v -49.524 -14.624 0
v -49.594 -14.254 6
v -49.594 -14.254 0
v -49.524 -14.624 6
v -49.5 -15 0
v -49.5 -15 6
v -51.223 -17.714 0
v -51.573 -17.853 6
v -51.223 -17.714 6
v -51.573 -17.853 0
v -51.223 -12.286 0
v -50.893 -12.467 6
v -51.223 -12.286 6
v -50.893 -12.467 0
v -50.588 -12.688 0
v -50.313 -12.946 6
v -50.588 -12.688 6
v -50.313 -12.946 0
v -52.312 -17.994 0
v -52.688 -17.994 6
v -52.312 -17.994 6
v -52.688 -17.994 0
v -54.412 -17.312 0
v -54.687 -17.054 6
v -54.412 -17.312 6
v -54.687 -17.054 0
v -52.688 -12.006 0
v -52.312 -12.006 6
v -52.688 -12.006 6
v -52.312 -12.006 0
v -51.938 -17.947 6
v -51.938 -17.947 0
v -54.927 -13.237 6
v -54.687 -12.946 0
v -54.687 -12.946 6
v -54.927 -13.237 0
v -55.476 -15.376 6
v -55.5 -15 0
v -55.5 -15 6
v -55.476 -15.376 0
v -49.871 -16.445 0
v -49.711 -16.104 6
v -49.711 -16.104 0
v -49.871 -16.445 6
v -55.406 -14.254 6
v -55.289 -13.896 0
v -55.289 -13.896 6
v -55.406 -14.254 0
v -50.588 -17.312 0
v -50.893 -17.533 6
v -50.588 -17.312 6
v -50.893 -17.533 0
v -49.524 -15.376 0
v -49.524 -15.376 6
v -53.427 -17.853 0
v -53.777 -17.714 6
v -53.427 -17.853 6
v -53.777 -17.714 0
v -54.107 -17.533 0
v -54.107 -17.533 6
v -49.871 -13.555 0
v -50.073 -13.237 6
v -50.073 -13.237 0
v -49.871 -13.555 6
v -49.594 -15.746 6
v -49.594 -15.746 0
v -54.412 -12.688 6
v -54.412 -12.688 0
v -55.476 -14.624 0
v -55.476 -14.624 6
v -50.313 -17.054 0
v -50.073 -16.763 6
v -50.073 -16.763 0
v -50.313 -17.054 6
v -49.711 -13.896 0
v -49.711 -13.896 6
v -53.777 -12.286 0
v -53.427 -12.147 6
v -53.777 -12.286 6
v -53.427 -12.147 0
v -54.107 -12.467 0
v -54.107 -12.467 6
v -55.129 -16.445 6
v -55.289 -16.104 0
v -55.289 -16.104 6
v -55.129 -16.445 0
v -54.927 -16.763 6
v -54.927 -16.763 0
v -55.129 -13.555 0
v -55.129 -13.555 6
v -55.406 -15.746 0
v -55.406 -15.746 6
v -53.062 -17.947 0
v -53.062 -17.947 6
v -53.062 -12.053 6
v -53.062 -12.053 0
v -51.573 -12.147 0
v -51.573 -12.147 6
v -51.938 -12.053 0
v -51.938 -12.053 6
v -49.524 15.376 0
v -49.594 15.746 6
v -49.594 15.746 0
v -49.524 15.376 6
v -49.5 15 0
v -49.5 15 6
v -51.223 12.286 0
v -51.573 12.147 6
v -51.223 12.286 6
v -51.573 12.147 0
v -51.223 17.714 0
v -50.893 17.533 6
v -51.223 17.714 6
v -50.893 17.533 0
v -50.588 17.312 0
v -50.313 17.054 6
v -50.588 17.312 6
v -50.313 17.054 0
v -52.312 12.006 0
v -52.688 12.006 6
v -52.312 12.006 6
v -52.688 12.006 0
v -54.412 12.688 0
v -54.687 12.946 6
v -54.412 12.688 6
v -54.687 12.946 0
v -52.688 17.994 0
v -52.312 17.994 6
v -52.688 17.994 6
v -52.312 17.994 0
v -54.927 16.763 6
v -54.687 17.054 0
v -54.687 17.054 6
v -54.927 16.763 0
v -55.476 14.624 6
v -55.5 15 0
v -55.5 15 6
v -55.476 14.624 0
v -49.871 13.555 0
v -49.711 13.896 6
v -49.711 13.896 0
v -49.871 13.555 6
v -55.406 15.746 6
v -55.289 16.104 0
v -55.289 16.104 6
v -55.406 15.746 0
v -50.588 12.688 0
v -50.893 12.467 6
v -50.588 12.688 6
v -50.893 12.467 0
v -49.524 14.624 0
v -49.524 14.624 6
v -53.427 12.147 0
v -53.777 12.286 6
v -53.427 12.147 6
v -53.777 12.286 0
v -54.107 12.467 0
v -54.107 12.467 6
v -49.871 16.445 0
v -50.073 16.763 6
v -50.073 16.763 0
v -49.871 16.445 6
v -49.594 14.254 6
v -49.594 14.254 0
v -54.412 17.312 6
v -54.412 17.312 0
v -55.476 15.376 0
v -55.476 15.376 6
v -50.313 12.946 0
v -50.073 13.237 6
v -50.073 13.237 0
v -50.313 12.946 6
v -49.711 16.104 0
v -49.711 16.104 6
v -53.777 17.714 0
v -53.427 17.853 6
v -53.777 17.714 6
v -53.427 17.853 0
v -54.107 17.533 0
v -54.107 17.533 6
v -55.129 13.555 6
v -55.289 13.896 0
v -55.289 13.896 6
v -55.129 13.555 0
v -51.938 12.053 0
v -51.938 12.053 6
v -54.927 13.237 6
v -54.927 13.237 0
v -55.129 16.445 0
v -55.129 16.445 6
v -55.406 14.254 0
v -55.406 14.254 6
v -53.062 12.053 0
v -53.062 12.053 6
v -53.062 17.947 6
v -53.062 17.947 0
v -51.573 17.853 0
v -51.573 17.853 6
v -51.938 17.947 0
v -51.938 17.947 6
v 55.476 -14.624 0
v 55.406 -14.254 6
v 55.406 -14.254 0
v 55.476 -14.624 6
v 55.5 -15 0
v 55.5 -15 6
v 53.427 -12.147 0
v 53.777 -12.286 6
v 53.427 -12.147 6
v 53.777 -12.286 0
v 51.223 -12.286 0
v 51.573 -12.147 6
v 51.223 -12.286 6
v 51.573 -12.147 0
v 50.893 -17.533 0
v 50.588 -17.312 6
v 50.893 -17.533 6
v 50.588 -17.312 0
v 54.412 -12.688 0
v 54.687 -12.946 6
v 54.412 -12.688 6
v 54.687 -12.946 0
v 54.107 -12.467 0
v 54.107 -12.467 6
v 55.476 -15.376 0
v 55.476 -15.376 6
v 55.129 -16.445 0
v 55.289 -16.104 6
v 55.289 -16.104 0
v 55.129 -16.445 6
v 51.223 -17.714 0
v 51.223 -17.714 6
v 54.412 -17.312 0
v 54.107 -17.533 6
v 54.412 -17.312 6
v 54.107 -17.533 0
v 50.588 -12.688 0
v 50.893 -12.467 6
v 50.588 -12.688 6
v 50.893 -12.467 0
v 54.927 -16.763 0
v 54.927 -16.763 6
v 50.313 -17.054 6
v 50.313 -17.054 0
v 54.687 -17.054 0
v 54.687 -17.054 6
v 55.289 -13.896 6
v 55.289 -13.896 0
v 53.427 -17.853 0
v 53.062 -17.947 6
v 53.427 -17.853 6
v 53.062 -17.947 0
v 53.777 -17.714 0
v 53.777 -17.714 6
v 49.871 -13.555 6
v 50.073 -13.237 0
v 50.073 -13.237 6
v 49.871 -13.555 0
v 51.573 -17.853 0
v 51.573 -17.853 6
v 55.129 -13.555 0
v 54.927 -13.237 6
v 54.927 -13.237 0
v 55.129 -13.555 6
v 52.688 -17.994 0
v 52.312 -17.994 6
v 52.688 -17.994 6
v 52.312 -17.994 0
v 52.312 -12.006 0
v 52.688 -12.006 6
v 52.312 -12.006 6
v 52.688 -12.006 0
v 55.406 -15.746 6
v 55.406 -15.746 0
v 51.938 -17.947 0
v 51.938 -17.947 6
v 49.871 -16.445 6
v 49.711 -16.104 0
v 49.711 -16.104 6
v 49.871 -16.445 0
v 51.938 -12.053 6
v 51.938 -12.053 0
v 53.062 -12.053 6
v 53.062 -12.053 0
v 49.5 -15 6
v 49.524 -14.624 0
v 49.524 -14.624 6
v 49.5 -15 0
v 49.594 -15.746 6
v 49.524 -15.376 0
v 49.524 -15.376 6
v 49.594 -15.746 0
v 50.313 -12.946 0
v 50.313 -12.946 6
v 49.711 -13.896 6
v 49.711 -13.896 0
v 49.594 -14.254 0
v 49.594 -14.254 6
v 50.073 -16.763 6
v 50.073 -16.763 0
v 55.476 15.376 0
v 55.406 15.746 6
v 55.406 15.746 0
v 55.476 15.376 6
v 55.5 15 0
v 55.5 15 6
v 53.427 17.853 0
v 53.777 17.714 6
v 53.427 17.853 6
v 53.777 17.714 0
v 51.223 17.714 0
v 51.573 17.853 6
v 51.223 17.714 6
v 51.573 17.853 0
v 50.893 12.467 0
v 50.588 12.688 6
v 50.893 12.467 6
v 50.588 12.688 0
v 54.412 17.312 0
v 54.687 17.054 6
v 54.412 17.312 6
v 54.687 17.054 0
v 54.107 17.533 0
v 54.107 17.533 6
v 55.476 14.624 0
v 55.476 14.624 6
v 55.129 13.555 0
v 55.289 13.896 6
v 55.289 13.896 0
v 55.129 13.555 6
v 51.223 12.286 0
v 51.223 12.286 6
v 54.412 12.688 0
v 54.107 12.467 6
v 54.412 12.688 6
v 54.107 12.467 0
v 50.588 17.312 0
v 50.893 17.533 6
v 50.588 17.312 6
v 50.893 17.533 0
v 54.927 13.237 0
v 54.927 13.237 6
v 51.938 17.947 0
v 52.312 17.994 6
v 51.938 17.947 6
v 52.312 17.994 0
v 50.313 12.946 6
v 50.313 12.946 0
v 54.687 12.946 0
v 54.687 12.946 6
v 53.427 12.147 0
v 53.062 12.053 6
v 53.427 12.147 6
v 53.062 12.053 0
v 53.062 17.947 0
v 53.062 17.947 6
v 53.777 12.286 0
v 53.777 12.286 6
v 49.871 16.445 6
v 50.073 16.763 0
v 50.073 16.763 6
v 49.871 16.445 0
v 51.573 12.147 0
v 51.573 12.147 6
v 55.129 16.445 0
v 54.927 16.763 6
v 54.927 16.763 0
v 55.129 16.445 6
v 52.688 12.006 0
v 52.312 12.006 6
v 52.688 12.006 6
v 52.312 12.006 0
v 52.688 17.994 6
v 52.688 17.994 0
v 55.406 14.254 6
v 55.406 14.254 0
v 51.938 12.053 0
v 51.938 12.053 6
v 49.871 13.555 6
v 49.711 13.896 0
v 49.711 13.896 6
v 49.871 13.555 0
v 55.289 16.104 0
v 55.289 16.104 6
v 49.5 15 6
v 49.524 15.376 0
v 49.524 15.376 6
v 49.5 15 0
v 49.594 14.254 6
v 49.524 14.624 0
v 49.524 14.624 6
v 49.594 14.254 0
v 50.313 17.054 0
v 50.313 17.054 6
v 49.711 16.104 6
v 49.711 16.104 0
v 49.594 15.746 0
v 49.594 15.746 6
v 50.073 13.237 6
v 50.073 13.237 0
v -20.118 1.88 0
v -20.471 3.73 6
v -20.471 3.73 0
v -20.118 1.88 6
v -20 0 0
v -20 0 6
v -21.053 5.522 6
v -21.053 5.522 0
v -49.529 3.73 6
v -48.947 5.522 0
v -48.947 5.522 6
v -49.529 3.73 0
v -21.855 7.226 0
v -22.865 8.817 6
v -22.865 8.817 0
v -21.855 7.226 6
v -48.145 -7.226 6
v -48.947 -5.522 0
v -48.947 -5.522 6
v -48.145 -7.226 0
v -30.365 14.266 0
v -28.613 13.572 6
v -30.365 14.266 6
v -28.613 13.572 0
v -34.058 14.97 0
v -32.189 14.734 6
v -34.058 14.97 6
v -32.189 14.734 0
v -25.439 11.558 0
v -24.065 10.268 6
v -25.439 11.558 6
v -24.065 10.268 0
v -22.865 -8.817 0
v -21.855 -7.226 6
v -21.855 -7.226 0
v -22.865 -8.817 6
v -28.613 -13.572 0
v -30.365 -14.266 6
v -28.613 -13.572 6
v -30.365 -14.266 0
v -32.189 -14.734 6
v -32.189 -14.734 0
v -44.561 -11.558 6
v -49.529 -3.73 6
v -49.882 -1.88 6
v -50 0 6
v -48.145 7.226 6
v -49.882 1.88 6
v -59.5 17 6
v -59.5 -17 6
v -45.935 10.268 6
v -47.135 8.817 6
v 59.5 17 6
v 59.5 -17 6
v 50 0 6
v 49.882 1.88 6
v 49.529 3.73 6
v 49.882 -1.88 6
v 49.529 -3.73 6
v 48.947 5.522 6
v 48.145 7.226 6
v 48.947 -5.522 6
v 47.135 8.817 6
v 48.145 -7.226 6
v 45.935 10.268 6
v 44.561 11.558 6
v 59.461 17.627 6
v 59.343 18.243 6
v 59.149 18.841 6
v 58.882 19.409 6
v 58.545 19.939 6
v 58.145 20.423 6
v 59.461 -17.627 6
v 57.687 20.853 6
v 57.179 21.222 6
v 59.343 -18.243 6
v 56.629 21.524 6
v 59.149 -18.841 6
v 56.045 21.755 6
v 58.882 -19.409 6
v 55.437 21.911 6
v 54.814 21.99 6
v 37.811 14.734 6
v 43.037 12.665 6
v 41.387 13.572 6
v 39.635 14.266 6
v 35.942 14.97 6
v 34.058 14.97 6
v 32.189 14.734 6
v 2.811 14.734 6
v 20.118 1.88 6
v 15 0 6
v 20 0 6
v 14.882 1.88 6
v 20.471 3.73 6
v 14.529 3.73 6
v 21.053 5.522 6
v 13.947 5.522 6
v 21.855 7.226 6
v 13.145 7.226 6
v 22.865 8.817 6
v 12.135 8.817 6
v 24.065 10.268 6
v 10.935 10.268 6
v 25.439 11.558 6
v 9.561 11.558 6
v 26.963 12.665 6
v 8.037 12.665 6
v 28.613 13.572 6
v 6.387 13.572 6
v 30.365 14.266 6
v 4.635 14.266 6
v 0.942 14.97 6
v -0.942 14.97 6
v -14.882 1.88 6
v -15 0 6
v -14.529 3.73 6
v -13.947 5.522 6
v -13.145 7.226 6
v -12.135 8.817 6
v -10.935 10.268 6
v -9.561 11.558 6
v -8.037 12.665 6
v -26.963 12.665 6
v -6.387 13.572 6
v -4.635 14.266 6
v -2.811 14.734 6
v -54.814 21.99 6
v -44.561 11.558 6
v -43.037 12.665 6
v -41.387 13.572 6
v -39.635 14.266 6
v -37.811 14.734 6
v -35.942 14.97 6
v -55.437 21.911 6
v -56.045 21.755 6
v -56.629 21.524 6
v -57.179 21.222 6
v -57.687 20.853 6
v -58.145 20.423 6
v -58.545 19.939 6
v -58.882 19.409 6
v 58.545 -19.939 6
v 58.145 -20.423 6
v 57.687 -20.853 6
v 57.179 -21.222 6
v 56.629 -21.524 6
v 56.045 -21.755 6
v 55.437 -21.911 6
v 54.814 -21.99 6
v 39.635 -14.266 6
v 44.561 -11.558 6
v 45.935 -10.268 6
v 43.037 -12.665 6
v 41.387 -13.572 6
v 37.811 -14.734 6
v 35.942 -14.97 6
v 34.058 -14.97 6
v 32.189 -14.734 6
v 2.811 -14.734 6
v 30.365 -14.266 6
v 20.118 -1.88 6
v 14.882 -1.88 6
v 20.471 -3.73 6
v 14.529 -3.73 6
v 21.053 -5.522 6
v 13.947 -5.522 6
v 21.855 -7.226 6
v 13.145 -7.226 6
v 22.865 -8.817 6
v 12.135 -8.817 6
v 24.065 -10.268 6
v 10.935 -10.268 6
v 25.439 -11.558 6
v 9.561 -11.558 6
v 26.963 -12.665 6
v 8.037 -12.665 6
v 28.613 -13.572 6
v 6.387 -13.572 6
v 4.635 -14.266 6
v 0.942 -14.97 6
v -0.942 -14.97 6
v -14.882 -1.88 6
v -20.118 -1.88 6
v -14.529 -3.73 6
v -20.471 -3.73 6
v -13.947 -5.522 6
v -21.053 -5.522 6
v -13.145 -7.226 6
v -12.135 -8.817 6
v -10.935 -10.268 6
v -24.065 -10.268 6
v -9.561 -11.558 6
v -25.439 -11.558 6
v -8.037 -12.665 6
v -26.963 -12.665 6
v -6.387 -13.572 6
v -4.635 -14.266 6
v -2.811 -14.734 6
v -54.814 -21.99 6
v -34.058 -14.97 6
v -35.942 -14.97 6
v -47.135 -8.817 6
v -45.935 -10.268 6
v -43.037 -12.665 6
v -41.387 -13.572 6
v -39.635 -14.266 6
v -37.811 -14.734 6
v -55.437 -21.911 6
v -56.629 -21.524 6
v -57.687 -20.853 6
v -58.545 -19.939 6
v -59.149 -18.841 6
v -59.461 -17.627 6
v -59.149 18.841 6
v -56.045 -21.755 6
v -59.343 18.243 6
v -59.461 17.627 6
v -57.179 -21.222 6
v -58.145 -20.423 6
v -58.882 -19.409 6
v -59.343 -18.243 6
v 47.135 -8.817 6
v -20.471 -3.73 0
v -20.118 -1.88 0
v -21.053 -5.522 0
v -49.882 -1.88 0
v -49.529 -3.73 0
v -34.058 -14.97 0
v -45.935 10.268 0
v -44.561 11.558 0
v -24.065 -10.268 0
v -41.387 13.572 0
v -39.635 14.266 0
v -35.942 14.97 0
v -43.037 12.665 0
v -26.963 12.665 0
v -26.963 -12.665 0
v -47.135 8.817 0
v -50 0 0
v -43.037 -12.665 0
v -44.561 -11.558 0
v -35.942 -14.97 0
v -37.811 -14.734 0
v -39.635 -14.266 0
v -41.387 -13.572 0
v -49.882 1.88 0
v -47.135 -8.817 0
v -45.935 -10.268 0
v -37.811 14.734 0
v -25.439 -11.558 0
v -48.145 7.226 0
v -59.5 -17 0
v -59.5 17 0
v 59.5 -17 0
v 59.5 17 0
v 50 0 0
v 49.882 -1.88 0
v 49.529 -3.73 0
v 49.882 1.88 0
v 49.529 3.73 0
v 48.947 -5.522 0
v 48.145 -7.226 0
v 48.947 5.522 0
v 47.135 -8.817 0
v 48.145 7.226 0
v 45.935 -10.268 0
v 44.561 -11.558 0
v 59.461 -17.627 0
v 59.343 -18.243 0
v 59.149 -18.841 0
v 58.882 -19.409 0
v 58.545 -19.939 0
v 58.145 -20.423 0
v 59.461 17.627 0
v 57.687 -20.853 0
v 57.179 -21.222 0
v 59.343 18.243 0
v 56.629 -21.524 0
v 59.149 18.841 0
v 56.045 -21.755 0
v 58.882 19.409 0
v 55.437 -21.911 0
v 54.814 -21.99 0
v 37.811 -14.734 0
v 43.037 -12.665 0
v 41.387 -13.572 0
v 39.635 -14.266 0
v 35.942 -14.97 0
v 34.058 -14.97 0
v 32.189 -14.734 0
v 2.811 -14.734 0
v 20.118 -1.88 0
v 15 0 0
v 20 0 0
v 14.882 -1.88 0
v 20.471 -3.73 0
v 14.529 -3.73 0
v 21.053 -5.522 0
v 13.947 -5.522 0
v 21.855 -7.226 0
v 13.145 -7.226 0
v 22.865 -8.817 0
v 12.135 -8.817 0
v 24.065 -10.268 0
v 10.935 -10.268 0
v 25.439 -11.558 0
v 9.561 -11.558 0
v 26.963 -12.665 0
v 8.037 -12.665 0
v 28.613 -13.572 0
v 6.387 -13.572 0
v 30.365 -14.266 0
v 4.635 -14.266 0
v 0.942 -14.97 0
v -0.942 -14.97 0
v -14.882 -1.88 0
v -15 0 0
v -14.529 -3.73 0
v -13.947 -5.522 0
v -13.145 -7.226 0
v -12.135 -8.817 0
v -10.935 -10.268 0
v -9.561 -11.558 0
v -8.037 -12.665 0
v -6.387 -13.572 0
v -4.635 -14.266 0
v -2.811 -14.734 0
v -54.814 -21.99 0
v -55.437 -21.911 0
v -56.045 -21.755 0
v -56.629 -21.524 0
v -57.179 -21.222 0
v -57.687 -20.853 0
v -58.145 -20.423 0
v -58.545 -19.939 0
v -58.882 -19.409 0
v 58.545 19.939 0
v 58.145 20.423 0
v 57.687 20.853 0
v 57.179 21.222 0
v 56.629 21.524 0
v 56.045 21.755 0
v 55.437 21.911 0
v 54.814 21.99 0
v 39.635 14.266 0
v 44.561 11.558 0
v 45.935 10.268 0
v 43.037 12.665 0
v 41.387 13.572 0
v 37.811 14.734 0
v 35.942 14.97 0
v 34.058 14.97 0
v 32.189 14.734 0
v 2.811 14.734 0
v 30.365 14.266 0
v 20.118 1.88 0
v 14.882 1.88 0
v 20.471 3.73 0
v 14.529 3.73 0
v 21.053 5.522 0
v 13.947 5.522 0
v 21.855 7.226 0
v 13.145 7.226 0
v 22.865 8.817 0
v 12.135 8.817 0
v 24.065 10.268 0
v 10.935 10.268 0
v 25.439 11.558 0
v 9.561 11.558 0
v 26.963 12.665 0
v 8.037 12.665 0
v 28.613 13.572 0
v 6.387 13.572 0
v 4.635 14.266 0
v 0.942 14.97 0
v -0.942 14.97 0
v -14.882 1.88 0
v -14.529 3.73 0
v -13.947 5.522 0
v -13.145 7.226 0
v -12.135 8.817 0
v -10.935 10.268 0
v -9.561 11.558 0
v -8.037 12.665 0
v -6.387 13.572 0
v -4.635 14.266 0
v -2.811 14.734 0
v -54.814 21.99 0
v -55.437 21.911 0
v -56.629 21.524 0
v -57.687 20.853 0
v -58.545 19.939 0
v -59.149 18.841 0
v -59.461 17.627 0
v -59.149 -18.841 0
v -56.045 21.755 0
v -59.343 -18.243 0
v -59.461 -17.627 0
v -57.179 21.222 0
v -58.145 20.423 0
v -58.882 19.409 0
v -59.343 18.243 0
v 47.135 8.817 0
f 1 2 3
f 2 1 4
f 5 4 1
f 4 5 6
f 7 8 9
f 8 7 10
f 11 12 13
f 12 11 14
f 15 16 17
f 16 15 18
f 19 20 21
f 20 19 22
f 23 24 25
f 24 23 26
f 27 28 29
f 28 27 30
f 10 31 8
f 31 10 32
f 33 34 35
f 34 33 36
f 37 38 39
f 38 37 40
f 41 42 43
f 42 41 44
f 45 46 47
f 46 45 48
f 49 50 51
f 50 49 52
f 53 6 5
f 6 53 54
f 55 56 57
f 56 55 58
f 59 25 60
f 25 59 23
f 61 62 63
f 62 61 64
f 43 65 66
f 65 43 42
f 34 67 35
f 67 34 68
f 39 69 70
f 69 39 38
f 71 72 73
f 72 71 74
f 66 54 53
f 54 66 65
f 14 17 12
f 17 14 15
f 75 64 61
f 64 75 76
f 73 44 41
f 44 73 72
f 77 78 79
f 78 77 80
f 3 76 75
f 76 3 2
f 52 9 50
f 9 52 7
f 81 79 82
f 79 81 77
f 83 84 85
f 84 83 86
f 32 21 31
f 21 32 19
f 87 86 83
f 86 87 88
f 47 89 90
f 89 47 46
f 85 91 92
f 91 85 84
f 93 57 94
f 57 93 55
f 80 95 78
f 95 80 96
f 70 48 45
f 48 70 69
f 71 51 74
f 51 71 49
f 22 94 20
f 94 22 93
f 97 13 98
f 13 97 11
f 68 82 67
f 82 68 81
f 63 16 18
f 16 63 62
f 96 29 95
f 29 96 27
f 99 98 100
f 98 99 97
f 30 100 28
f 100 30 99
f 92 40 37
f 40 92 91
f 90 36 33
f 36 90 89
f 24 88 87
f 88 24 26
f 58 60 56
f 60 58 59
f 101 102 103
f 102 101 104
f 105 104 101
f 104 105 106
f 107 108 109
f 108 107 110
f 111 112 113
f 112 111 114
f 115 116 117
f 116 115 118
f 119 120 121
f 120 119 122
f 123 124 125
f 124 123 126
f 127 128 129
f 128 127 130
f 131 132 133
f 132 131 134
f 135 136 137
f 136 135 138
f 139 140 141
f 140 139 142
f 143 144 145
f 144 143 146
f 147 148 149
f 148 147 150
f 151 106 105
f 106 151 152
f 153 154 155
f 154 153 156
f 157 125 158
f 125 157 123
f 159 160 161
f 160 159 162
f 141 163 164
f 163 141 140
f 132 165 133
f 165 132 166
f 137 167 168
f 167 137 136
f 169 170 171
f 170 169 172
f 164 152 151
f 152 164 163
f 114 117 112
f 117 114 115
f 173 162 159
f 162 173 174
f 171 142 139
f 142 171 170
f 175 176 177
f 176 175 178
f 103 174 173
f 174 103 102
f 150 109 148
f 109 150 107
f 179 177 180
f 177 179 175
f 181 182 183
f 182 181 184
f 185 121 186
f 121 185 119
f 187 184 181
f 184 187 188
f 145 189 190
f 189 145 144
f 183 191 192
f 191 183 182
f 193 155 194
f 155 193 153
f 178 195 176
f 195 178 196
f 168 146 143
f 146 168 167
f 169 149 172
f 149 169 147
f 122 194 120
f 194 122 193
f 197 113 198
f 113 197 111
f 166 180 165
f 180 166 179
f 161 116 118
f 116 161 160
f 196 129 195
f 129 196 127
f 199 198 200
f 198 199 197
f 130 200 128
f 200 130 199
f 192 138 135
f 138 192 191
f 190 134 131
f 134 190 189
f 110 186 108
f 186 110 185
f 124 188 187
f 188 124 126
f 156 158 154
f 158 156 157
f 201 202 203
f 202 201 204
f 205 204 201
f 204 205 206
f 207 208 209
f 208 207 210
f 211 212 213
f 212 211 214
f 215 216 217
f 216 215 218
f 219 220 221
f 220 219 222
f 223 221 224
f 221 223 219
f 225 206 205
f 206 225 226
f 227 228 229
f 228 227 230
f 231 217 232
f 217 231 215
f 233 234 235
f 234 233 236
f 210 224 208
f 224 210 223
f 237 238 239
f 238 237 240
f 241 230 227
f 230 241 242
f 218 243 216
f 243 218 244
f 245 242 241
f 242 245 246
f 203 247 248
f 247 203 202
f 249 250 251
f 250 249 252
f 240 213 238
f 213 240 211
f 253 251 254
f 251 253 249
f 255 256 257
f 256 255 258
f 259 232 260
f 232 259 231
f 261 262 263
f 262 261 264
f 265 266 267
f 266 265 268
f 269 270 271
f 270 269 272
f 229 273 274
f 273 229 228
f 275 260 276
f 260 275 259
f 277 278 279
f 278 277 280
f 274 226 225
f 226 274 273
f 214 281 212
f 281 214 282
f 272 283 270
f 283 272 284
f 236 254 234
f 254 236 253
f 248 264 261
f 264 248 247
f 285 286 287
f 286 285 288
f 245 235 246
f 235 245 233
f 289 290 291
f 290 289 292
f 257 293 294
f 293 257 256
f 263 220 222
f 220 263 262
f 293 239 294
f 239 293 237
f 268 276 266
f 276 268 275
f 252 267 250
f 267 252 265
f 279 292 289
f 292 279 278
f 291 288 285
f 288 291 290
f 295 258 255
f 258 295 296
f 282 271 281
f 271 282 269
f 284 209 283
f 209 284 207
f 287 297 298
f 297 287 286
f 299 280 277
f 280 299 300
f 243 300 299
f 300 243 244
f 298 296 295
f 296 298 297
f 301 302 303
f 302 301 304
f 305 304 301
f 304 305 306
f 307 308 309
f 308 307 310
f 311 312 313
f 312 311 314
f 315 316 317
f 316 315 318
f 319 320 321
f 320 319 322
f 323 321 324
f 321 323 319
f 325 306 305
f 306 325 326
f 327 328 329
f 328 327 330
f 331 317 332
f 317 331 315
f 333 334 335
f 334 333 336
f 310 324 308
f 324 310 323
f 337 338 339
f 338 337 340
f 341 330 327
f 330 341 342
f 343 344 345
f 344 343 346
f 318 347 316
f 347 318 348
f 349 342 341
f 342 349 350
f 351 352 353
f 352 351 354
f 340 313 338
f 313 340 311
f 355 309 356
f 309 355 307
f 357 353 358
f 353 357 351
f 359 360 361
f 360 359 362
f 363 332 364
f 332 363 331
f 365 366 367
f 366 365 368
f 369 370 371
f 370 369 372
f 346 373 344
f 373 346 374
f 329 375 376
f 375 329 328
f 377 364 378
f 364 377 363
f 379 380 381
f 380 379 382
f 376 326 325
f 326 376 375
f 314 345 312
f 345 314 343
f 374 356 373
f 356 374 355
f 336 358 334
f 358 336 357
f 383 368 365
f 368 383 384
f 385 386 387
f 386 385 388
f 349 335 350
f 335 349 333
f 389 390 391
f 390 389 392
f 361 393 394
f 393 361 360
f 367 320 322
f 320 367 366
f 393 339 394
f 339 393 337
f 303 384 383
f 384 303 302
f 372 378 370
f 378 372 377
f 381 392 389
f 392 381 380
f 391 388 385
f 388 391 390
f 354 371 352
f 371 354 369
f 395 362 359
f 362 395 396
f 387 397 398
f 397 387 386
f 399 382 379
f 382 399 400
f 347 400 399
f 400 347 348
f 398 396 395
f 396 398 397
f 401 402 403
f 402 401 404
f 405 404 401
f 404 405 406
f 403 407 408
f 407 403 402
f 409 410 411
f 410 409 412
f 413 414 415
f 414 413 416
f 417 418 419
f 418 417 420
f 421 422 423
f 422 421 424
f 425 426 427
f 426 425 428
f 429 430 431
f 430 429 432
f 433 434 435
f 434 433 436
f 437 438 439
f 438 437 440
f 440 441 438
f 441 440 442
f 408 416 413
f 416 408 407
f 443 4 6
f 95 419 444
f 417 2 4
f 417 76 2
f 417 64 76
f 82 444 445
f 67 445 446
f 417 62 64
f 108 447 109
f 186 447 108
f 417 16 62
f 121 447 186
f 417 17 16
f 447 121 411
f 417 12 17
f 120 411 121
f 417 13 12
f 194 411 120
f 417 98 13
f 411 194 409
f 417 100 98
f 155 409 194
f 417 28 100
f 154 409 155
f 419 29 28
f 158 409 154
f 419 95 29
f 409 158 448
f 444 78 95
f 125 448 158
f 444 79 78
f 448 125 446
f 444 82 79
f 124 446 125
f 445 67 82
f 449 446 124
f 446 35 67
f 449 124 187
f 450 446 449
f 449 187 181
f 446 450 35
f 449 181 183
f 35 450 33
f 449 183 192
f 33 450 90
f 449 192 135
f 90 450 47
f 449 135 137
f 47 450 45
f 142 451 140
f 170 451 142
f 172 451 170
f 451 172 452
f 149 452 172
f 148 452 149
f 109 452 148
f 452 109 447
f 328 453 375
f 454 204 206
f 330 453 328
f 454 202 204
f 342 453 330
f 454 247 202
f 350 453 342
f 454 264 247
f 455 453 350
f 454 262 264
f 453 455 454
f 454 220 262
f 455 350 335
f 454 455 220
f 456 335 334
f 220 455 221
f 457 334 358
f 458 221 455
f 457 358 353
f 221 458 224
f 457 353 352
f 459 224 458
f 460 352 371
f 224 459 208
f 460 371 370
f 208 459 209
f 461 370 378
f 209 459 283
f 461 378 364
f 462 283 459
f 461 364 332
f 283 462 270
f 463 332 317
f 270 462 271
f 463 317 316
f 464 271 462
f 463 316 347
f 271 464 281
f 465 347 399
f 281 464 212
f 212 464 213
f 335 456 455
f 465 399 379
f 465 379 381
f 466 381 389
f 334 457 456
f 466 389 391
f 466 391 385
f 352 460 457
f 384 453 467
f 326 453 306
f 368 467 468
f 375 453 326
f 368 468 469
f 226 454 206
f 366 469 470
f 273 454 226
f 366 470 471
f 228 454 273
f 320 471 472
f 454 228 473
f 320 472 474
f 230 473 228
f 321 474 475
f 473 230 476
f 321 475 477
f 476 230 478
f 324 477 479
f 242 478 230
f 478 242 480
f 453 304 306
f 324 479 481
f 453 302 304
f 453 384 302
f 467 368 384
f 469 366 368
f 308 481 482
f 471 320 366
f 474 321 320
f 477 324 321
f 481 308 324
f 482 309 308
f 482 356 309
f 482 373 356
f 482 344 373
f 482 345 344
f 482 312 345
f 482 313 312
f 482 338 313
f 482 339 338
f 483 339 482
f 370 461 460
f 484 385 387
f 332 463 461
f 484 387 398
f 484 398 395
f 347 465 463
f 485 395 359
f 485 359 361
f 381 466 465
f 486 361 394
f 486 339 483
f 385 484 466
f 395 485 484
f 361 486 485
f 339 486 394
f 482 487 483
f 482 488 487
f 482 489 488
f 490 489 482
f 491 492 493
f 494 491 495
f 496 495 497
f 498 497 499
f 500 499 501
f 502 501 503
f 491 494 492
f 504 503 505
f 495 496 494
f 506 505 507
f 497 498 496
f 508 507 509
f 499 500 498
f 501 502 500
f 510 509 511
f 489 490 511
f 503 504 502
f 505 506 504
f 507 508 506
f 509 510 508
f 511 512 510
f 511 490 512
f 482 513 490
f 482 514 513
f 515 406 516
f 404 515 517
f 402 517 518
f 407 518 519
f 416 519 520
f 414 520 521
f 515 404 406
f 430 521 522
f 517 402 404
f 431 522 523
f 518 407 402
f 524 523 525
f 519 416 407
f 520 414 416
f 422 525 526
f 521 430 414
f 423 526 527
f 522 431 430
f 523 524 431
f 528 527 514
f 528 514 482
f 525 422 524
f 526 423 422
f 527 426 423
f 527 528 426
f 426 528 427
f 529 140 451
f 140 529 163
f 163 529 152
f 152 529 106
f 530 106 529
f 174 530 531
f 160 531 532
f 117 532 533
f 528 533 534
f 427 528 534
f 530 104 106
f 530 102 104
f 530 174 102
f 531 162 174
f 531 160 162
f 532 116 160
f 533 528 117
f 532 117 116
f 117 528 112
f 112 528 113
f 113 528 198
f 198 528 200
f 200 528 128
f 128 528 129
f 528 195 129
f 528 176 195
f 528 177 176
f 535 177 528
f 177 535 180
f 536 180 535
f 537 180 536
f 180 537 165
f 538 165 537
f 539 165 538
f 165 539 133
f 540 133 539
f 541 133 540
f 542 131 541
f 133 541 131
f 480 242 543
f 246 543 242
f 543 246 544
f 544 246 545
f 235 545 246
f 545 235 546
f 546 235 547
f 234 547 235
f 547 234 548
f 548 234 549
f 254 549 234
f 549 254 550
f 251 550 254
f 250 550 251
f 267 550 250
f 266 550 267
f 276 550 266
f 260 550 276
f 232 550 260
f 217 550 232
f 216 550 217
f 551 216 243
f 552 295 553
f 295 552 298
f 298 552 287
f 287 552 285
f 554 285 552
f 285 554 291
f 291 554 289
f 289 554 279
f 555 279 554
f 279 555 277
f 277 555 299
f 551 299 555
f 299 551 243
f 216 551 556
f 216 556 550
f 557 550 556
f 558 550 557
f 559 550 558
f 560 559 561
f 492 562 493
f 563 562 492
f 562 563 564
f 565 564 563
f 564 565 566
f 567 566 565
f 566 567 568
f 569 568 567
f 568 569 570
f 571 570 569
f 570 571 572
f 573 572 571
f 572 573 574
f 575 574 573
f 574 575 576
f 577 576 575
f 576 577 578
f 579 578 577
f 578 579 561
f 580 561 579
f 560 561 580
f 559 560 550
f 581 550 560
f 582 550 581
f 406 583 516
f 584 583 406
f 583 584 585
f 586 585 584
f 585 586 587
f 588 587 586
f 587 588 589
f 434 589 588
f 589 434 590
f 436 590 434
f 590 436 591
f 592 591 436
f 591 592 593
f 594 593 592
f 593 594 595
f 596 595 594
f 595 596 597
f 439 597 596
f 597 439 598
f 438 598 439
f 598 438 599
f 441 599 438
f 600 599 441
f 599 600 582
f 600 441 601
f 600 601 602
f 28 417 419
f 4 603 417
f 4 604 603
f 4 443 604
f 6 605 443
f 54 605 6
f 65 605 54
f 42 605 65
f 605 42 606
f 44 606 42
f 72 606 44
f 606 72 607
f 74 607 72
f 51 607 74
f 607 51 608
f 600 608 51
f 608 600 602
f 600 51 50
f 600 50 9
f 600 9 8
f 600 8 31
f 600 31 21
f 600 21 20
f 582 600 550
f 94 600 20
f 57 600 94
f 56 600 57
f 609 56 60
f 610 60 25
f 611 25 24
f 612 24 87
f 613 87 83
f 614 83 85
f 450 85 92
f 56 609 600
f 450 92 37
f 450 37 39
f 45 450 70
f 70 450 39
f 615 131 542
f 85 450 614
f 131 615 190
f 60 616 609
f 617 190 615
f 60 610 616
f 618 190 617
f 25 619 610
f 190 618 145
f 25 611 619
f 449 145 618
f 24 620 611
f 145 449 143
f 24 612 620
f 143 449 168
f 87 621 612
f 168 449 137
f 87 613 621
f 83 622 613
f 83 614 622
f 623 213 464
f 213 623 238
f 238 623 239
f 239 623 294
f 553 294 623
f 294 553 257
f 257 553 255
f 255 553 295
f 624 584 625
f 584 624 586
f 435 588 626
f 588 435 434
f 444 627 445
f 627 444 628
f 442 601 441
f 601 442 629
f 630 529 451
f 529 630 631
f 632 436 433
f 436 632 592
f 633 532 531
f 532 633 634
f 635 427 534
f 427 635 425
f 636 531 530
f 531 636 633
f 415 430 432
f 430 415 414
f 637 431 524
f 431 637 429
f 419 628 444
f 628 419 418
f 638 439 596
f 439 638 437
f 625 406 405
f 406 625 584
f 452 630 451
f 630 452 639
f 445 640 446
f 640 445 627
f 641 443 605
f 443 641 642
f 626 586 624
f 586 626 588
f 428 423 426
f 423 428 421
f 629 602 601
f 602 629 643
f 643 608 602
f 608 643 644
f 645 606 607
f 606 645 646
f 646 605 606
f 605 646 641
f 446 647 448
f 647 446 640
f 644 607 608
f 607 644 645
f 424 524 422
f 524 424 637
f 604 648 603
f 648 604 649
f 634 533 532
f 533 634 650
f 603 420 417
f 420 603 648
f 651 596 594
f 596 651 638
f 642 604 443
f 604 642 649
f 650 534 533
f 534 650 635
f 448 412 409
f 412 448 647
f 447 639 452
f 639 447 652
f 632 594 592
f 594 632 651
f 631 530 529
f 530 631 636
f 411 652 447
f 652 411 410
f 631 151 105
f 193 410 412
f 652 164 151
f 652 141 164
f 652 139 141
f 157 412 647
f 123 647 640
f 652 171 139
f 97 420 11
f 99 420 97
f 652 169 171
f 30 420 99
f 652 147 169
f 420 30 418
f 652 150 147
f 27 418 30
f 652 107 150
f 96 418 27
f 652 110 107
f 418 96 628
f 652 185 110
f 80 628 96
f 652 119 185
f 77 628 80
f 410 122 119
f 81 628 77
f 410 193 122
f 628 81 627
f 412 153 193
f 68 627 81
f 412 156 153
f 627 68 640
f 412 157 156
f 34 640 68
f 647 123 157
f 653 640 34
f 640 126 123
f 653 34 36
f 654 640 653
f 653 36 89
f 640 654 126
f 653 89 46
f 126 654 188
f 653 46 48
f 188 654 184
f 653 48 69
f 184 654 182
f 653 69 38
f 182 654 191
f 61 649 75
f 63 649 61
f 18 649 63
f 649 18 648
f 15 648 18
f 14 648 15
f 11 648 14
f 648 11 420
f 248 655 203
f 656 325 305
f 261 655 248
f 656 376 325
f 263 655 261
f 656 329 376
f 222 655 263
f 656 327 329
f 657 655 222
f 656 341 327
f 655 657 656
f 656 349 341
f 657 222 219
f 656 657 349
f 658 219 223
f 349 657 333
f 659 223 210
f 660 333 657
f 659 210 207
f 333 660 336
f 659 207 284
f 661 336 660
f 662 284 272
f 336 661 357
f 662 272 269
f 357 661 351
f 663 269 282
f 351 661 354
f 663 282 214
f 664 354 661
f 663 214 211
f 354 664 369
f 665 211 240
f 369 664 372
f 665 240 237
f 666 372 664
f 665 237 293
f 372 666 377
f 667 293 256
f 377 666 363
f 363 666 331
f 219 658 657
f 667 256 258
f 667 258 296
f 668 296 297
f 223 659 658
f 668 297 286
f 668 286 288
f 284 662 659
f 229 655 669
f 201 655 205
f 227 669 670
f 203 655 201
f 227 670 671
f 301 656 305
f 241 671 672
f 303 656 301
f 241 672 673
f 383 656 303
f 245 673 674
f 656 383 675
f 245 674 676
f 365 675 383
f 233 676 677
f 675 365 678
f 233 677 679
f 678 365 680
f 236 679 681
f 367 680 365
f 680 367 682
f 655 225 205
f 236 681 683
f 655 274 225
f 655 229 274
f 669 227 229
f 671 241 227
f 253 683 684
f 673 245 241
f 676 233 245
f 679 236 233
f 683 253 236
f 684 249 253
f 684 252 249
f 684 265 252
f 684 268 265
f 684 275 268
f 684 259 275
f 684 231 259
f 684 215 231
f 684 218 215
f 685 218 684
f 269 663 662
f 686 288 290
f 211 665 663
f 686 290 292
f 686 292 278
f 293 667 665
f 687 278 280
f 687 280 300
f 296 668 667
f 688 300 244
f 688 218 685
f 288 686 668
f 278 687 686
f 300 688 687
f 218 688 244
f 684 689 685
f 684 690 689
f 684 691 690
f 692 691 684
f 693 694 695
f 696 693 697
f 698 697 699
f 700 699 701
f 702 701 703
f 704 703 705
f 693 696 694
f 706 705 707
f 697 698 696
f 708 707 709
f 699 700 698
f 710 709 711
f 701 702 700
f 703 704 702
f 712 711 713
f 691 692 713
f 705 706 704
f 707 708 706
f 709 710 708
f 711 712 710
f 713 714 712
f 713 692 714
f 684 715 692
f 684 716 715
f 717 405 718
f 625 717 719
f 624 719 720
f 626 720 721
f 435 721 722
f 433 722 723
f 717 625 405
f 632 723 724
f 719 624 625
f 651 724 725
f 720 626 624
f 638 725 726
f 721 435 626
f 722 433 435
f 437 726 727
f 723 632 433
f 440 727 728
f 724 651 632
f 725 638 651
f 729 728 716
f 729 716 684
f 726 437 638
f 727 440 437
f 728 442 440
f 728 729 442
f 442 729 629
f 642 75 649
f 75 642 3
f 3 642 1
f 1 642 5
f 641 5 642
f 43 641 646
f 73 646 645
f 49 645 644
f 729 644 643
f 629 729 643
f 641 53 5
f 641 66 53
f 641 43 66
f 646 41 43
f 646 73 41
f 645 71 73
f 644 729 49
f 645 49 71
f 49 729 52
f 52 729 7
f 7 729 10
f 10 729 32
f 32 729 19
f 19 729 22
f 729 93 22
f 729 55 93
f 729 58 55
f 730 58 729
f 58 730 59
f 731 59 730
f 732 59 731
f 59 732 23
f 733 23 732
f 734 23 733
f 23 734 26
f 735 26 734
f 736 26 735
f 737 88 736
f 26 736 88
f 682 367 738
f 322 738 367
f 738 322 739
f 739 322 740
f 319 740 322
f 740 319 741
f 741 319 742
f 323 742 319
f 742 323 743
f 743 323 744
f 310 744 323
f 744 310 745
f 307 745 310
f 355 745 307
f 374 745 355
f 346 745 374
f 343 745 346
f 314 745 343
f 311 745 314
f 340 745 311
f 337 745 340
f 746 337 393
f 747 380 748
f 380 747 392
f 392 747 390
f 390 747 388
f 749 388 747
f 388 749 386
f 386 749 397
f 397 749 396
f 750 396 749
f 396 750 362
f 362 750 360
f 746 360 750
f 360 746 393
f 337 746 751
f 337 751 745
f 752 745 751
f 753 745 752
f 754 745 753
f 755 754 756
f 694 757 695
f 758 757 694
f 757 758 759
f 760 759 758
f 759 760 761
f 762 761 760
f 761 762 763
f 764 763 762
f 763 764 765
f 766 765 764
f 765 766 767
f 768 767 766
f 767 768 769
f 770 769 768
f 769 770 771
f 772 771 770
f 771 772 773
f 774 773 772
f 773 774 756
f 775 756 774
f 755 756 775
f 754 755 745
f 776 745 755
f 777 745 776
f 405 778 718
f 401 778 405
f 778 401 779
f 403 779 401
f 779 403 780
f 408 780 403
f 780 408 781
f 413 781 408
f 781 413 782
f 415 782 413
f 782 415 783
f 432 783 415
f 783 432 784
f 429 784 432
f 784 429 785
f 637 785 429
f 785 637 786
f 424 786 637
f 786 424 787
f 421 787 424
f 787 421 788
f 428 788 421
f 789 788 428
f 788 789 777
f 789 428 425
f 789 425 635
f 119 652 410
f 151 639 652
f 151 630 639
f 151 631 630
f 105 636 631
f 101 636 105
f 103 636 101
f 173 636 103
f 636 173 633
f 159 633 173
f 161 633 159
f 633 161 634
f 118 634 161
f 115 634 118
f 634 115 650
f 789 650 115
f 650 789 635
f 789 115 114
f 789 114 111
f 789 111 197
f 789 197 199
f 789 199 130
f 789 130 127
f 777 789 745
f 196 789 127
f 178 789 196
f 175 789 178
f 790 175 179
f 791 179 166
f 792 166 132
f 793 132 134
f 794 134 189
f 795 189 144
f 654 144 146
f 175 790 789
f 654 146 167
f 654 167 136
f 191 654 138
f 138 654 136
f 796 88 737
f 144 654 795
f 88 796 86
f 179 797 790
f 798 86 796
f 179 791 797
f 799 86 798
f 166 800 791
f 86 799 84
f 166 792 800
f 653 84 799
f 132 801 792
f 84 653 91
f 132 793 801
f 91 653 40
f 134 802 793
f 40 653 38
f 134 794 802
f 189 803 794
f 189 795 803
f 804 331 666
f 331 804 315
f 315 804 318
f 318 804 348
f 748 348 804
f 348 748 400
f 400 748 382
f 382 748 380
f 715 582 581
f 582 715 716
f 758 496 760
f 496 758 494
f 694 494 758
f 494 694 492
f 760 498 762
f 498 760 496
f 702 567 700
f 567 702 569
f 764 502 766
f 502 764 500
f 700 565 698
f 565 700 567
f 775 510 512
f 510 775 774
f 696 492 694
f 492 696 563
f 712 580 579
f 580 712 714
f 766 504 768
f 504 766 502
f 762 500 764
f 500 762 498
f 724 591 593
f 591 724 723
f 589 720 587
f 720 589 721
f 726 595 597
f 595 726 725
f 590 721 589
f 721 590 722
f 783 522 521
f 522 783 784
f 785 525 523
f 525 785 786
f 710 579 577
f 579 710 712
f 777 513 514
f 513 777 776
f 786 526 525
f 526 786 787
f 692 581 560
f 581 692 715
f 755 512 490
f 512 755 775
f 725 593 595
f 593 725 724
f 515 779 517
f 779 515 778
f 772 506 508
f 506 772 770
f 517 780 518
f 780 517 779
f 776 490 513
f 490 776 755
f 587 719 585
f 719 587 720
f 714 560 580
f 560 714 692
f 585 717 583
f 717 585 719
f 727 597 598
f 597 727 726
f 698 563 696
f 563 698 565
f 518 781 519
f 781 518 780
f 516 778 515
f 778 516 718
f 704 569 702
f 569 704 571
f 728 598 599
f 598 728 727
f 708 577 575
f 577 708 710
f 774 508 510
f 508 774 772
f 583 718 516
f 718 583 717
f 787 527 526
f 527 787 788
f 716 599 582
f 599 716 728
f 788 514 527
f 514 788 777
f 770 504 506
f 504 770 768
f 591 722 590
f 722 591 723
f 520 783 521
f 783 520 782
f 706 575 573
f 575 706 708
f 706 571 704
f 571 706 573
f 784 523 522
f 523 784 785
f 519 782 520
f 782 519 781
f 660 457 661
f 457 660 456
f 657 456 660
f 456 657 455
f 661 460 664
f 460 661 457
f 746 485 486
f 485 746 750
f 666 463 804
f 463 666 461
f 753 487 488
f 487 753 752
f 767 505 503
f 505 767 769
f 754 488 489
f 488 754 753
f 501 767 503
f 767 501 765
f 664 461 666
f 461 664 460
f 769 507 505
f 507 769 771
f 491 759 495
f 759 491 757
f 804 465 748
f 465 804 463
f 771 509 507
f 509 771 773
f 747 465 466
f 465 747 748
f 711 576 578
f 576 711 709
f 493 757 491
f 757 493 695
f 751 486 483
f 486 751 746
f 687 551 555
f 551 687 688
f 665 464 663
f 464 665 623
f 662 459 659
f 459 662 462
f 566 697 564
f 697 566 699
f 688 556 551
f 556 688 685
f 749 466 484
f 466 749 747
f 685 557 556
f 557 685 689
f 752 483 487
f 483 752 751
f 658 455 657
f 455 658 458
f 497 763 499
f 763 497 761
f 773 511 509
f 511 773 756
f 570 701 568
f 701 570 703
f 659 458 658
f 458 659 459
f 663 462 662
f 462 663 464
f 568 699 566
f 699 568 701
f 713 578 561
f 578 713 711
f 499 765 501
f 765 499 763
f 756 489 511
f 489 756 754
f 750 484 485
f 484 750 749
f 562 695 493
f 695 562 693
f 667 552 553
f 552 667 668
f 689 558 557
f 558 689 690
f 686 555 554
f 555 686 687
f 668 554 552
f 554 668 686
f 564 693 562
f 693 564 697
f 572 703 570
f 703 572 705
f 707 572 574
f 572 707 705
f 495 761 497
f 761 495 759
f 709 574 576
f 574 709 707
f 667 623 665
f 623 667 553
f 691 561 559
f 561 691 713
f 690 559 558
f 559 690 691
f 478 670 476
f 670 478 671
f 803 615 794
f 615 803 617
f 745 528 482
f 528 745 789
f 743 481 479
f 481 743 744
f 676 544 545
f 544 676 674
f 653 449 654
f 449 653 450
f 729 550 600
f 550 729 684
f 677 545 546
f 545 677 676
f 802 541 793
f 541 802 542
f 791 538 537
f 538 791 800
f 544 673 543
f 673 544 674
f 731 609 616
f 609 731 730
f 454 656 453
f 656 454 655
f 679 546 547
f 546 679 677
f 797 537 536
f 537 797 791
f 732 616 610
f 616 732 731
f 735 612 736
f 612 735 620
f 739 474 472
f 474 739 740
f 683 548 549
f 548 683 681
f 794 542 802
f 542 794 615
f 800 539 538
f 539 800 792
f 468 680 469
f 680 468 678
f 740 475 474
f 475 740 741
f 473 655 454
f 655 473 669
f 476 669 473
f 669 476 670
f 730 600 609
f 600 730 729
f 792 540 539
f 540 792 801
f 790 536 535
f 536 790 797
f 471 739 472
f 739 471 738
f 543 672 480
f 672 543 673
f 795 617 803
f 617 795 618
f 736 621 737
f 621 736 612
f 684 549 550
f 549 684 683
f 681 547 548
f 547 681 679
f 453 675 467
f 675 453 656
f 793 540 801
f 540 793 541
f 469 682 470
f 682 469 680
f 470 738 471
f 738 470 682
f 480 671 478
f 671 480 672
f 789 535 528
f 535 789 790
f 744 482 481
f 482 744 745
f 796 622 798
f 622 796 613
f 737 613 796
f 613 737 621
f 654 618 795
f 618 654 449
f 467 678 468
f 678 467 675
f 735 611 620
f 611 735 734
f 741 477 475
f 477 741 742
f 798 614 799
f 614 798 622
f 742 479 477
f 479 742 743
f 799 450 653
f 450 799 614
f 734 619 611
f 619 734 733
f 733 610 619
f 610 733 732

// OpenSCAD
$fn = 50;

difference() {
	union() {
		hull() {
			translate(v = [-54.5, 17.0, 0]) {
				cylinder(h = 6, r = 5);
			}
			translate(v = [54.5, 17.0, 0]) {
				cylinder(h = 6, r = 5);
			}
			translate(v = [-54.5, -17.0, 0]) {
				cylinder(h = 6, r = 5);
			}
			translate(v = [54.5, -17.0, 0]) {
				cylinder(h = 6, r = 5);
			}
		}
	}
	union() {
		translate(v = [-52.5, -15.0, -100.0]) {
			cylinder(h = 200, r = 3.0);
		}
		translate(v = [-52.5, 15.0, -100.0]) {
			cylinder(h = 200, r = 3.0);
		}
		translate(v = [52.5, -15.0, -100.0]) {
			cylinder(h = 200, r = 3.0);
		}
		translate(v = [52.5, 15.0, -100.0]) {
			cylinder(h = 200, r = 3.0);
		}
		translate(v = [-52.5, -15.0, -100.0]) {
			cylinder(h = 200, r = 1.5);
		}
		translate(v = [-52.5, 15.0, -100.0]) {
			cylinder(h = 200, r = 1.5);
		}
		translate(v = [52.5, -15.0, -100.0]) {
			cylinder(h = 200, r = 1.5);
		}
		translate(v = [52.5, 15.0, -100.0]) {
			cylinder(h = 200, r = 1.5);
		}
		translate(v = [-35.0, 0, 0.0]) {
			cylinder(h = 6, r = 15.0);
		}
		cylinder(h = 6, r = 15.0);
		translate(v = [35.0, 0, 0.0]) {
			cylinder(h = 6, r = 15.0);
		}
	}
}
